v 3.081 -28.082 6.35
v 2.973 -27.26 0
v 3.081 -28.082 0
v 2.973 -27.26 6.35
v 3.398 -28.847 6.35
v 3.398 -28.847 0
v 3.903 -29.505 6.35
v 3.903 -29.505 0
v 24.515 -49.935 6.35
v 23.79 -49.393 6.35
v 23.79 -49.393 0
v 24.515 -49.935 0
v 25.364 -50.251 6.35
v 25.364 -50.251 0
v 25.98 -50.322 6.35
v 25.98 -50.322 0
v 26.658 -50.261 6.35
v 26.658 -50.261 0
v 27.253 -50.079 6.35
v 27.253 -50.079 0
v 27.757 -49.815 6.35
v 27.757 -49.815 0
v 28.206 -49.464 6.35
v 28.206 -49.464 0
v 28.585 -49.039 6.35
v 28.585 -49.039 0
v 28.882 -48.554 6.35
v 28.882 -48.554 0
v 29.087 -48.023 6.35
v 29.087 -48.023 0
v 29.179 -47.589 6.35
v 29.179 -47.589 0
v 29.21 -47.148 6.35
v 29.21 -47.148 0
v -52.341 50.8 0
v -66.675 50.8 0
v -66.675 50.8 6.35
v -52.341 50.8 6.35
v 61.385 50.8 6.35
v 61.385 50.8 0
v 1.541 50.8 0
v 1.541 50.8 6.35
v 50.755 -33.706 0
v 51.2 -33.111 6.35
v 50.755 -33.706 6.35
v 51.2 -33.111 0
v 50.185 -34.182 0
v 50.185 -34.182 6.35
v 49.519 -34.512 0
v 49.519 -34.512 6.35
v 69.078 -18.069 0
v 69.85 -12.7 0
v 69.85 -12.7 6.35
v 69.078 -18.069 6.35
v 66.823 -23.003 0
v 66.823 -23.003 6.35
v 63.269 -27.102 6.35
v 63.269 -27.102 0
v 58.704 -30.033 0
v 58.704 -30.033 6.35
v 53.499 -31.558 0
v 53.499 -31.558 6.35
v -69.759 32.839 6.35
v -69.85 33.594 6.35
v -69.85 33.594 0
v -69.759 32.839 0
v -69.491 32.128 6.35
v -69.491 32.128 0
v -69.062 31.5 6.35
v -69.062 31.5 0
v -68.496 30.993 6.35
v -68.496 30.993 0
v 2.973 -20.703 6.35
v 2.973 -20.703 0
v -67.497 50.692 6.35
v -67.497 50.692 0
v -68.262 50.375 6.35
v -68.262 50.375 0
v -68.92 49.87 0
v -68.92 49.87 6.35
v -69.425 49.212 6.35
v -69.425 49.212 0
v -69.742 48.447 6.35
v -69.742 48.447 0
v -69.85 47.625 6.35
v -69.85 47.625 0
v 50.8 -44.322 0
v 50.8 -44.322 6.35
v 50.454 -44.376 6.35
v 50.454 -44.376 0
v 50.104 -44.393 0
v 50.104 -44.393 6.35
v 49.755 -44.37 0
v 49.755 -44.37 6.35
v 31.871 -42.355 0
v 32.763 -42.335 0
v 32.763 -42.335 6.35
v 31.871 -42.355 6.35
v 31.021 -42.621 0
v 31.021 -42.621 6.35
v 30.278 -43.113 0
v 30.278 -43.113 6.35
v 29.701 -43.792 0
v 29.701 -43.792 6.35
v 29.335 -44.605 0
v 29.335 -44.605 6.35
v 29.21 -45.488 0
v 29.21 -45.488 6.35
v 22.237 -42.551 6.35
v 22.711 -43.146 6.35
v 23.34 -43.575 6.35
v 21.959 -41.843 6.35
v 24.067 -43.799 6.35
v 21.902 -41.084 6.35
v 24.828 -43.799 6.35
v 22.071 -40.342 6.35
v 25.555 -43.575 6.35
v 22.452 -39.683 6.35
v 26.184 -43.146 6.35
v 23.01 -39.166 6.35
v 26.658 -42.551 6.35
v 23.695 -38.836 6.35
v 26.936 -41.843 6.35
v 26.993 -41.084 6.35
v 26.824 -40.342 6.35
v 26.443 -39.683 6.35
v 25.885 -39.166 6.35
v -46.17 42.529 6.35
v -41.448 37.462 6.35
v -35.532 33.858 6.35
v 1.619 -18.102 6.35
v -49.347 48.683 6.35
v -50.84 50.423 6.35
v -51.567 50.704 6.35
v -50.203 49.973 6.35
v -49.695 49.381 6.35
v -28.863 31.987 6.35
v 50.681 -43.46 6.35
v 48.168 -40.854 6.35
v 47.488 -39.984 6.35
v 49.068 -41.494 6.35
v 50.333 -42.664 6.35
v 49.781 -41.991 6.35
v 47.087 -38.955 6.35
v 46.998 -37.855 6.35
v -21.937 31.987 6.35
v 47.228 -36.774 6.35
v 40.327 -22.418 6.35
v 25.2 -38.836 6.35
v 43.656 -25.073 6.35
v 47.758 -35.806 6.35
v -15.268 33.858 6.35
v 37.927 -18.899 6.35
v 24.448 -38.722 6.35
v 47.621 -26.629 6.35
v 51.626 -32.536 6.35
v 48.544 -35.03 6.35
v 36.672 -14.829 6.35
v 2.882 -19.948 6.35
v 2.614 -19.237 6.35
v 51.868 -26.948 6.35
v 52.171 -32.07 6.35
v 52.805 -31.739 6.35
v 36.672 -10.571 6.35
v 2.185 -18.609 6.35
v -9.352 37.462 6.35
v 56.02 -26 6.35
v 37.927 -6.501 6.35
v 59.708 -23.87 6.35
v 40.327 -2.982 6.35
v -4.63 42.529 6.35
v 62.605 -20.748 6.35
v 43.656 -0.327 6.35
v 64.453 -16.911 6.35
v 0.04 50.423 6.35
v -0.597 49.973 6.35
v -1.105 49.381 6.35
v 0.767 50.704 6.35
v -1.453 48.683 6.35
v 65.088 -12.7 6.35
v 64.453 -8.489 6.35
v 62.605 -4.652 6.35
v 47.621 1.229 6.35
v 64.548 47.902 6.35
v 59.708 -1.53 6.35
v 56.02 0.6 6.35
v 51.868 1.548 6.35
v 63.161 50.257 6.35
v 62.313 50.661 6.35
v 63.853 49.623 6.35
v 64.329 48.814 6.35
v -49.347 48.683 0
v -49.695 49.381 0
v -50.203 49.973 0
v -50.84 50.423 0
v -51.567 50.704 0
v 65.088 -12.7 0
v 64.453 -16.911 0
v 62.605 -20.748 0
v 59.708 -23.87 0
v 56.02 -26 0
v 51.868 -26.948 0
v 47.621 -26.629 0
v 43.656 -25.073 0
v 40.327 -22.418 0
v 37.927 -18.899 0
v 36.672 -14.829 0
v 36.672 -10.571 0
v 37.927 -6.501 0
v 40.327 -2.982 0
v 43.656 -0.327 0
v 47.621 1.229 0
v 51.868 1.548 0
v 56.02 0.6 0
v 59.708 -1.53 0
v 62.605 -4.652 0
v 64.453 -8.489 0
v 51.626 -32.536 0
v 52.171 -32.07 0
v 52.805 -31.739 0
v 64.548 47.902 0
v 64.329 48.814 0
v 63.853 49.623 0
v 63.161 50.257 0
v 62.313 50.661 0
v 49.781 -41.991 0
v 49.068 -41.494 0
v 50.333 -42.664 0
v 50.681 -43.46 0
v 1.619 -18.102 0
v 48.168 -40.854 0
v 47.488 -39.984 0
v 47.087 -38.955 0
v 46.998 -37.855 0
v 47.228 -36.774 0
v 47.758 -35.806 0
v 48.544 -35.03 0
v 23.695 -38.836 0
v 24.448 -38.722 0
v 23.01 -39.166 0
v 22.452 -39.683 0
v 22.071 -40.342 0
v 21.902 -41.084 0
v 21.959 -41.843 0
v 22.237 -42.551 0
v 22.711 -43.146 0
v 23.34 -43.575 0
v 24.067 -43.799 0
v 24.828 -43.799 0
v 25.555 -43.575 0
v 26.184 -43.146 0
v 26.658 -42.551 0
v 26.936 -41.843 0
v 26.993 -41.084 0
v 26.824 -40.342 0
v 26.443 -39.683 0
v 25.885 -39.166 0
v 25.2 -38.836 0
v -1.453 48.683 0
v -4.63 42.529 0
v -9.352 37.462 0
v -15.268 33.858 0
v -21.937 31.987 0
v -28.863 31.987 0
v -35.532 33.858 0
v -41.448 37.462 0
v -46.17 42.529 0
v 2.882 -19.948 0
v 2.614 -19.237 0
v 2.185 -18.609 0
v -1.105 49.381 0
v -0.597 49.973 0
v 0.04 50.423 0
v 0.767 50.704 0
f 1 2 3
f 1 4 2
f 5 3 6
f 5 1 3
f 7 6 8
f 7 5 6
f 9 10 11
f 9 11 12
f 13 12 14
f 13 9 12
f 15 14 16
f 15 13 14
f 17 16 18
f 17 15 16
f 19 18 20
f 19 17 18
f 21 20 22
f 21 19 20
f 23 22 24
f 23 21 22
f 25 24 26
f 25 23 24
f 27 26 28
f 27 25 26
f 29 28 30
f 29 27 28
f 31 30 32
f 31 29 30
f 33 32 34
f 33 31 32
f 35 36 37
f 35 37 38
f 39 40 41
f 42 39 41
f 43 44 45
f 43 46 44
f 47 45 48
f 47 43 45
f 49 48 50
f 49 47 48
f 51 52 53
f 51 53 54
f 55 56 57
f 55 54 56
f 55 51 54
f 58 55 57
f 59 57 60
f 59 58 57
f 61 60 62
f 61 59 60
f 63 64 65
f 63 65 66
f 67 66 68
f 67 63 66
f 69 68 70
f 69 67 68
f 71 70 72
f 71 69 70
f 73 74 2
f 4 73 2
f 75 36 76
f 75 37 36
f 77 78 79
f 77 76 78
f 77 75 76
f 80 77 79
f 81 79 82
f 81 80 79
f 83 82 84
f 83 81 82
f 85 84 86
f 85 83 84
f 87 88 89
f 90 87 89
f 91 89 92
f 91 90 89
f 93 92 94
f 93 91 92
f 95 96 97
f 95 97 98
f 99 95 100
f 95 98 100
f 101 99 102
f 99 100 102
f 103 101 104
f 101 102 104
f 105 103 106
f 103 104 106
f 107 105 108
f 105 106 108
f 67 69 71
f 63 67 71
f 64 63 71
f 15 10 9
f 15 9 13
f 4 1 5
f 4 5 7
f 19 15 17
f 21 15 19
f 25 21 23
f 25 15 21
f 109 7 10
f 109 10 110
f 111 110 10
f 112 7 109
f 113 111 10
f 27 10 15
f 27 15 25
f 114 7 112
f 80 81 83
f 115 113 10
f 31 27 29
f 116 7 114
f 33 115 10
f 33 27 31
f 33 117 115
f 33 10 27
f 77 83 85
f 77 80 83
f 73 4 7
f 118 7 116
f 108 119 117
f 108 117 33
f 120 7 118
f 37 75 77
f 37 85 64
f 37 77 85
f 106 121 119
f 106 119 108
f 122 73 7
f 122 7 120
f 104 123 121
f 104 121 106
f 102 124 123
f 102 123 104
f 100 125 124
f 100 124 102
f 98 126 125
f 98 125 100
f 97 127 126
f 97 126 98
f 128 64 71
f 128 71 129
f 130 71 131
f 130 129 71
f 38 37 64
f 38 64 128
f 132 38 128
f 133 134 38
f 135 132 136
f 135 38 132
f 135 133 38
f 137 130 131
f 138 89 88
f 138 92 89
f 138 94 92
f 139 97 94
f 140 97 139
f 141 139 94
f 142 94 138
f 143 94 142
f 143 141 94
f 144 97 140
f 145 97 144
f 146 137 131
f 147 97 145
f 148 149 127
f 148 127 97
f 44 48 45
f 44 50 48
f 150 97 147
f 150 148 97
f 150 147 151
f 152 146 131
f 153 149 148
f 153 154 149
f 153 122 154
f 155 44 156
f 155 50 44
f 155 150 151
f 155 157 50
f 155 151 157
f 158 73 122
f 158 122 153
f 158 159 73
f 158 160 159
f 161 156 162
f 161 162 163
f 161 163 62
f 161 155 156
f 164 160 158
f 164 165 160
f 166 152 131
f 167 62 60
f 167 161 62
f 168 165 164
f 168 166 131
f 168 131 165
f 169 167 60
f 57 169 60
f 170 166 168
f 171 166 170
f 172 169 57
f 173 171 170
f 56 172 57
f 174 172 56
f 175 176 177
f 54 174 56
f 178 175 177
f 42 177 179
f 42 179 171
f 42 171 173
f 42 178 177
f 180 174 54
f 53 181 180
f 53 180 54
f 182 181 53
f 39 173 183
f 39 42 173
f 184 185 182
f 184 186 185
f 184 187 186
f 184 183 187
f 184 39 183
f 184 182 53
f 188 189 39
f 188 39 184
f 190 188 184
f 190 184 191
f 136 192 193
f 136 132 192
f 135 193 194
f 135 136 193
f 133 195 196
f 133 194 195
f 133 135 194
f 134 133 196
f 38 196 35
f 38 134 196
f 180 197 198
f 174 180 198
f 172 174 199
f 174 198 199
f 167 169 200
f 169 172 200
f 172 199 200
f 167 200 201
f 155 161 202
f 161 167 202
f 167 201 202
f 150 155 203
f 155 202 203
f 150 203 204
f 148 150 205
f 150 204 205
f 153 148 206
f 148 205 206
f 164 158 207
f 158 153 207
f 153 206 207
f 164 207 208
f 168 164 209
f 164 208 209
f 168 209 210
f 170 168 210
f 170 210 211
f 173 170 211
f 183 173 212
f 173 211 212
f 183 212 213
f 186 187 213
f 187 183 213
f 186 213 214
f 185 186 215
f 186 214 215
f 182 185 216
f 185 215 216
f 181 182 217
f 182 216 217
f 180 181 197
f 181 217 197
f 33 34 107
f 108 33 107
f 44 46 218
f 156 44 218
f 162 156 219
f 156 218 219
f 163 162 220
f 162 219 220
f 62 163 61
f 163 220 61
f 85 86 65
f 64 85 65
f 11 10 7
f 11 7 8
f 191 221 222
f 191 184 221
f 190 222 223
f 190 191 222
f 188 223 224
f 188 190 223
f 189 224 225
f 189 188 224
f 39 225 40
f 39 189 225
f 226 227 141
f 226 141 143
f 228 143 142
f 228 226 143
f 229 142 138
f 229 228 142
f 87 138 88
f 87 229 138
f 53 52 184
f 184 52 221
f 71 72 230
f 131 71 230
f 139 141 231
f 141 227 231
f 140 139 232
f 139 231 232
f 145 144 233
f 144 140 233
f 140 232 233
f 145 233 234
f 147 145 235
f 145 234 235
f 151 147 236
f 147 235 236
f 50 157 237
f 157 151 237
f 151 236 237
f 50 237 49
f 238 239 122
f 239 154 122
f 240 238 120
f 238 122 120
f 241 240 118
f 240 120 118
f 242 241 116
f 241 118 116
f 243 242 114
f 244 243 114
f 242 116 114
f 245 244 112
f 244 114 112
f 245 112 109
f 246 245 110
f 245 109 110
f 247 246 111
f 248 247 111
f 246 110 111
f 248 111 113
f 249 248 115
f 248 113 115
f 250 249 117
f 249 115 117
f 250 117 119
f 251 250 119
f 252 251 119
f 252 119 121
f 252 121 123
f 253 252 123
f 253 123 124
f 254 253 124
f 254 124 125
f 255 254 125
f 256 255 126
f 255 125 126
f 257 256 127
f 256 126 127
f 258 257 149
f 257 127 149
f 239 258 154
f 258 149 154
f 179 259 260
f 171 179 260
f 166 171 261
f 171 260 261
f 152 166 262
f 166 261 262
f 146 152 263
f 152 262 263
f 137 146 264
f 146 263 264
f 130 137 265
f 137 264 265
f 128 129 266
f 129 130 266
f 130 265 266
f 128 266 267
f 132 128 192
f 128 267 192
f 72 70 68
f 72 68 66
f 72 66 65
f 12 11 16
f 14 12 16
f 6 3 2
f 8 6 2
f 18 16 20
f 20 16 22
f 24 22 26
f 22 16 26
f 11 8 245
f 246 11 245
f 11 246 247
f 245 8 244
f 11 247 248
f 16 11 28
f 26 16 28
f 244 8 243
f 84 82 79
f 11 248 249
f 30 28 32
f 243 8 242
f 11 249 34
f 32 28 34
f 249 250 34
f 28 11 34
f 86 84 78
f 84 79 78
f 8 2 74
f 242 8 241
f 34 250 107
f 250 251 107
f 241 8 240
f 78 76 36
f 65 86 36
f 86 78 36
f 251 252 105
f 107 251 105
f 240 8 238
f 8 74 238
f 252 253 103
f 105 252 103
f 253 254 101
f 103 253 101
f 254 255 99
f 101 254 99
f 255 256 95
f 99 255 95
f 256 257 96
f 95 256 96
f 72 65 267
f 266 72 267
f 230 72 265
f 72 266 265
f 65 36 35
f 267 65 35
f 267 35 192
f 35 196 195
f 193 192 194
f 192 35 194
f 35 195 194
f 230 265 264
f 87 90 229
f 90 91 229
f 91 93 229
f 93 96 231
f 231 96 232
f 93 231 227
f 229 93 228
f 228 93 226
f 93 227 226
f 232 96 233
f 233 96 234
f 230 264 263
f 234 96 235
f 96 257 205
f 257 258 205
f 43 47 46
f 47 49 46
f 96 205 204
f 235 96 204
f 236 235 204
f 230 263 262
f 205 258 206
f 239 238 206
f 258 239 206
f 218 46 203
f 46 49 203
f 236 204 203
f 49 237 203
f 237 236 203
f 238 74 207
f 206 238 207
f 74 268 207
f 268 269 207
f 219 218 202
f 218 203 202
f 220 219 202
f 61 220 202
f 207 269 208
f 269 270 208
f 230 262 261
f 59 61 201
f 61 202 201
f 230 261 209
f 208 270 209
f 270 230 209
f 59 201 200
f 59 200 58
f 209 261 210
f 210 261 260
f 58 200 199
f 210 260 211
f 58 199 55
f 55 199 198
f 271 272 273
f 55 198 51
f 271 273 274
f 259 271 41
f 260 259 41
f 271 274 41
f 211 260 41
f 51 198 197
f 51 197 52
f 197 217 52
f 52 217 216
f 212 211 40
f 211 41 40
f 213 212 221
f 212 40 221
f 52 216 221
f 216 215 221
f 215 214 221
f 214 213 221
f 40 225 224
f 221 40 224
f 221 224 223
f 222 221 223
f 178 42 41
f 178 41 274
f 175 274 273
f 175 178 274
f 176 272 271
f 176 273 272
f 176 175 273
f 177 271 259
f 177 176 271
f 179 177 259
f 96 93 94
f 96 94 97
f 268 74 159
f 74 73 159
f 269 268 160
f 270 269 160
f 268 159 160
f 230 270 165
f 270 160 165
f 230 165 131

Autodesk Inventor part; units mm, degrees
ref_plane "YZ Plane" through (0, 0, 0) normal (1, 0, 0) x (0, 1, 0)
ref_plane "XZ Plane" through (0, 0, 0) normal (0, 1, 0) x (-1, 0, 0)
ref_plane "XY Plane" through (0, 0, 0) normal (0, 0, 1) x (1, 0, 0)
sketch "Sketch1" plane through (0, 0, 0) normal (0, 0, 1) x (1, 0, 0)
  line L0 (-69.85, -50.8) -> (69.85, -50.8) construction
  line L1 (69.85, -50.8) -> (69.85, 50.8) construction
  line L2 (69.85, 50.8) -> (-69.85, 50.8) construction
  line L3 (-69.85, 50.8) -> (-69.85, -50.8) construction
  line L4 (-69.85, -50.8) -> (69.85, 50.8) construction
  line L5 (69.85, -50.8) -> (-69.85, 50.8) construction
  circle A0 centre (-25.4, 57.15) radius 25.4 construction
  circle A1 centre (50.8, -12.7) radius 14.2875 construction
  circle A2 centre (50.8, -12.7) radius 19.05 construction
  line L6 (-69.85, 31.9409) -> (2.9726, -19.05) construction
  line L7 (2.9726, -19.05) -> (2.9726, -50.8) construction
  line L8 (29.21, -50.8) -> (29.21, -41.91) construction
  line L9 (29.21, -41.91) -> (50.8, -38.1) construction
  line L10 (50.8, -38.1) -> (50.8, -31.75) construction
  line L11 (69.85, -12.7) -> (64.2945, 50.8) construction
  line L12 (2.9726, -50.8) -> (29.21, -50.8)
  line L13 (29.21, -50.8) -> (29.21, -41.91)
  line L14 (50.8, -38.1) -> (50.8, -31.75)
  line L15 (69.85, -12.7) -> (64.2945, 50.8)
  line L16 (64.2945, 50.8) -> (-0.8066, 50.8)
  line L17 (-69.85, 50.8) -> (-49.9934, 50.8)
  line L18 (-69.85, 50.8) -> (-69.85, 31.9409)
  line L19 (-69.85, 31.9409) -> (2.9726, -19.05)
  line L20 (2.9726, -19.05) -> (2.9726, -50.8)
  circle A3 centre (50.8, -12.7) radius 14.2875
  arc A4 (-49.9934, 50.8) -> (-0.8066, 50.8) centre (-25.4, 57.15) ccw
  circle A5 centre (50.8, -38.1) radius 3.81
  arc A6 (50.8, -31.75) -> (69.85, -12.7) centre (50.8, -12.7) ccw
  line L21 (50.8, -38.1) -> (50.8, -44.4954)
  line L22 (50.8, -44.4954) -> (29.21, -41.91)
  circle A7 centre (24.4475, -41.275) radius 4.7625 construction
  point P0 (0, 0)
  point P1 (50.8, -34.29)
  point P2 (50.8, -41.91)
  dimension "d0" = 101.6
  dimension "d1" = 139.7
  dimension "d3" = 50.8
  dimension "d4" = 6.35
  dimension "d6" = 19.05
  dimension "d7" = 38.1
  dimension "d8" = 38.1
  dimension "d9" = 28.575
  dimension "d10" = 125
  dimension "d11" = 31.75
  dimension "d12" = 88.9
  dimension "d15" = 8.89
  dimension "d18" = 95
  dimension "d25" = 7.62
  dimension "d26" = 25.4
  dimension "d28" = 4.7625
  dimension "d31" = 6.35
  dimension "d33" = 21.59
  dimension "d38" = 76.2
  dimension "d40" = 9.525
  dimension "d49" = 9.525
extrude "Extrusion1" add sketch "Sketch1" along normal blind 6.35 contours L20 L19 L18 L17 A4 L16 L15 A6 L14 A5 L21 L22 L13 L12
fillet "Fillet1" radius 3.175 8 edges at (29.21, -50.8, 3.175) (29.21, -41.91, 3.175) (64.2945, 50.8, 3.175) (-0.8066, 50.8, 3.175) (-49.9934, 50.8, 3.175) (-69.85, 50.8, 3.175) (-69.85, 31.9409, 3.175) (2.9726, -19.05, 3.175)
chamfer "Chamfer1" distance 22.225 angle 45 1 edges at (2.9726, -50.8, 3.175)
fillet "Fillet3" radius 3.175 2 edges at (2.9726, -28.575, 3.175) (25.1976, -50.8, 3.175)
fillet "Fillet4" radius 3.175 4 edges at (50.8, -31.75, 3.175) (50.8, -34.29, 3.175) (50.8, -41.91, 3.175) (50.8, -44.4954, 3.175)
hole "Hole1" at (50.8, -12.7, 0) at (24.4475, -41.275, 0) direction (0, 0, 1) diameter 5.1054 end through all clearance for "Flat Head Machine Screw (82)" size "#10" standard "Ansi Unified Screw Threads"
properties part number "CL1-002" material "Aluminum 6061"
